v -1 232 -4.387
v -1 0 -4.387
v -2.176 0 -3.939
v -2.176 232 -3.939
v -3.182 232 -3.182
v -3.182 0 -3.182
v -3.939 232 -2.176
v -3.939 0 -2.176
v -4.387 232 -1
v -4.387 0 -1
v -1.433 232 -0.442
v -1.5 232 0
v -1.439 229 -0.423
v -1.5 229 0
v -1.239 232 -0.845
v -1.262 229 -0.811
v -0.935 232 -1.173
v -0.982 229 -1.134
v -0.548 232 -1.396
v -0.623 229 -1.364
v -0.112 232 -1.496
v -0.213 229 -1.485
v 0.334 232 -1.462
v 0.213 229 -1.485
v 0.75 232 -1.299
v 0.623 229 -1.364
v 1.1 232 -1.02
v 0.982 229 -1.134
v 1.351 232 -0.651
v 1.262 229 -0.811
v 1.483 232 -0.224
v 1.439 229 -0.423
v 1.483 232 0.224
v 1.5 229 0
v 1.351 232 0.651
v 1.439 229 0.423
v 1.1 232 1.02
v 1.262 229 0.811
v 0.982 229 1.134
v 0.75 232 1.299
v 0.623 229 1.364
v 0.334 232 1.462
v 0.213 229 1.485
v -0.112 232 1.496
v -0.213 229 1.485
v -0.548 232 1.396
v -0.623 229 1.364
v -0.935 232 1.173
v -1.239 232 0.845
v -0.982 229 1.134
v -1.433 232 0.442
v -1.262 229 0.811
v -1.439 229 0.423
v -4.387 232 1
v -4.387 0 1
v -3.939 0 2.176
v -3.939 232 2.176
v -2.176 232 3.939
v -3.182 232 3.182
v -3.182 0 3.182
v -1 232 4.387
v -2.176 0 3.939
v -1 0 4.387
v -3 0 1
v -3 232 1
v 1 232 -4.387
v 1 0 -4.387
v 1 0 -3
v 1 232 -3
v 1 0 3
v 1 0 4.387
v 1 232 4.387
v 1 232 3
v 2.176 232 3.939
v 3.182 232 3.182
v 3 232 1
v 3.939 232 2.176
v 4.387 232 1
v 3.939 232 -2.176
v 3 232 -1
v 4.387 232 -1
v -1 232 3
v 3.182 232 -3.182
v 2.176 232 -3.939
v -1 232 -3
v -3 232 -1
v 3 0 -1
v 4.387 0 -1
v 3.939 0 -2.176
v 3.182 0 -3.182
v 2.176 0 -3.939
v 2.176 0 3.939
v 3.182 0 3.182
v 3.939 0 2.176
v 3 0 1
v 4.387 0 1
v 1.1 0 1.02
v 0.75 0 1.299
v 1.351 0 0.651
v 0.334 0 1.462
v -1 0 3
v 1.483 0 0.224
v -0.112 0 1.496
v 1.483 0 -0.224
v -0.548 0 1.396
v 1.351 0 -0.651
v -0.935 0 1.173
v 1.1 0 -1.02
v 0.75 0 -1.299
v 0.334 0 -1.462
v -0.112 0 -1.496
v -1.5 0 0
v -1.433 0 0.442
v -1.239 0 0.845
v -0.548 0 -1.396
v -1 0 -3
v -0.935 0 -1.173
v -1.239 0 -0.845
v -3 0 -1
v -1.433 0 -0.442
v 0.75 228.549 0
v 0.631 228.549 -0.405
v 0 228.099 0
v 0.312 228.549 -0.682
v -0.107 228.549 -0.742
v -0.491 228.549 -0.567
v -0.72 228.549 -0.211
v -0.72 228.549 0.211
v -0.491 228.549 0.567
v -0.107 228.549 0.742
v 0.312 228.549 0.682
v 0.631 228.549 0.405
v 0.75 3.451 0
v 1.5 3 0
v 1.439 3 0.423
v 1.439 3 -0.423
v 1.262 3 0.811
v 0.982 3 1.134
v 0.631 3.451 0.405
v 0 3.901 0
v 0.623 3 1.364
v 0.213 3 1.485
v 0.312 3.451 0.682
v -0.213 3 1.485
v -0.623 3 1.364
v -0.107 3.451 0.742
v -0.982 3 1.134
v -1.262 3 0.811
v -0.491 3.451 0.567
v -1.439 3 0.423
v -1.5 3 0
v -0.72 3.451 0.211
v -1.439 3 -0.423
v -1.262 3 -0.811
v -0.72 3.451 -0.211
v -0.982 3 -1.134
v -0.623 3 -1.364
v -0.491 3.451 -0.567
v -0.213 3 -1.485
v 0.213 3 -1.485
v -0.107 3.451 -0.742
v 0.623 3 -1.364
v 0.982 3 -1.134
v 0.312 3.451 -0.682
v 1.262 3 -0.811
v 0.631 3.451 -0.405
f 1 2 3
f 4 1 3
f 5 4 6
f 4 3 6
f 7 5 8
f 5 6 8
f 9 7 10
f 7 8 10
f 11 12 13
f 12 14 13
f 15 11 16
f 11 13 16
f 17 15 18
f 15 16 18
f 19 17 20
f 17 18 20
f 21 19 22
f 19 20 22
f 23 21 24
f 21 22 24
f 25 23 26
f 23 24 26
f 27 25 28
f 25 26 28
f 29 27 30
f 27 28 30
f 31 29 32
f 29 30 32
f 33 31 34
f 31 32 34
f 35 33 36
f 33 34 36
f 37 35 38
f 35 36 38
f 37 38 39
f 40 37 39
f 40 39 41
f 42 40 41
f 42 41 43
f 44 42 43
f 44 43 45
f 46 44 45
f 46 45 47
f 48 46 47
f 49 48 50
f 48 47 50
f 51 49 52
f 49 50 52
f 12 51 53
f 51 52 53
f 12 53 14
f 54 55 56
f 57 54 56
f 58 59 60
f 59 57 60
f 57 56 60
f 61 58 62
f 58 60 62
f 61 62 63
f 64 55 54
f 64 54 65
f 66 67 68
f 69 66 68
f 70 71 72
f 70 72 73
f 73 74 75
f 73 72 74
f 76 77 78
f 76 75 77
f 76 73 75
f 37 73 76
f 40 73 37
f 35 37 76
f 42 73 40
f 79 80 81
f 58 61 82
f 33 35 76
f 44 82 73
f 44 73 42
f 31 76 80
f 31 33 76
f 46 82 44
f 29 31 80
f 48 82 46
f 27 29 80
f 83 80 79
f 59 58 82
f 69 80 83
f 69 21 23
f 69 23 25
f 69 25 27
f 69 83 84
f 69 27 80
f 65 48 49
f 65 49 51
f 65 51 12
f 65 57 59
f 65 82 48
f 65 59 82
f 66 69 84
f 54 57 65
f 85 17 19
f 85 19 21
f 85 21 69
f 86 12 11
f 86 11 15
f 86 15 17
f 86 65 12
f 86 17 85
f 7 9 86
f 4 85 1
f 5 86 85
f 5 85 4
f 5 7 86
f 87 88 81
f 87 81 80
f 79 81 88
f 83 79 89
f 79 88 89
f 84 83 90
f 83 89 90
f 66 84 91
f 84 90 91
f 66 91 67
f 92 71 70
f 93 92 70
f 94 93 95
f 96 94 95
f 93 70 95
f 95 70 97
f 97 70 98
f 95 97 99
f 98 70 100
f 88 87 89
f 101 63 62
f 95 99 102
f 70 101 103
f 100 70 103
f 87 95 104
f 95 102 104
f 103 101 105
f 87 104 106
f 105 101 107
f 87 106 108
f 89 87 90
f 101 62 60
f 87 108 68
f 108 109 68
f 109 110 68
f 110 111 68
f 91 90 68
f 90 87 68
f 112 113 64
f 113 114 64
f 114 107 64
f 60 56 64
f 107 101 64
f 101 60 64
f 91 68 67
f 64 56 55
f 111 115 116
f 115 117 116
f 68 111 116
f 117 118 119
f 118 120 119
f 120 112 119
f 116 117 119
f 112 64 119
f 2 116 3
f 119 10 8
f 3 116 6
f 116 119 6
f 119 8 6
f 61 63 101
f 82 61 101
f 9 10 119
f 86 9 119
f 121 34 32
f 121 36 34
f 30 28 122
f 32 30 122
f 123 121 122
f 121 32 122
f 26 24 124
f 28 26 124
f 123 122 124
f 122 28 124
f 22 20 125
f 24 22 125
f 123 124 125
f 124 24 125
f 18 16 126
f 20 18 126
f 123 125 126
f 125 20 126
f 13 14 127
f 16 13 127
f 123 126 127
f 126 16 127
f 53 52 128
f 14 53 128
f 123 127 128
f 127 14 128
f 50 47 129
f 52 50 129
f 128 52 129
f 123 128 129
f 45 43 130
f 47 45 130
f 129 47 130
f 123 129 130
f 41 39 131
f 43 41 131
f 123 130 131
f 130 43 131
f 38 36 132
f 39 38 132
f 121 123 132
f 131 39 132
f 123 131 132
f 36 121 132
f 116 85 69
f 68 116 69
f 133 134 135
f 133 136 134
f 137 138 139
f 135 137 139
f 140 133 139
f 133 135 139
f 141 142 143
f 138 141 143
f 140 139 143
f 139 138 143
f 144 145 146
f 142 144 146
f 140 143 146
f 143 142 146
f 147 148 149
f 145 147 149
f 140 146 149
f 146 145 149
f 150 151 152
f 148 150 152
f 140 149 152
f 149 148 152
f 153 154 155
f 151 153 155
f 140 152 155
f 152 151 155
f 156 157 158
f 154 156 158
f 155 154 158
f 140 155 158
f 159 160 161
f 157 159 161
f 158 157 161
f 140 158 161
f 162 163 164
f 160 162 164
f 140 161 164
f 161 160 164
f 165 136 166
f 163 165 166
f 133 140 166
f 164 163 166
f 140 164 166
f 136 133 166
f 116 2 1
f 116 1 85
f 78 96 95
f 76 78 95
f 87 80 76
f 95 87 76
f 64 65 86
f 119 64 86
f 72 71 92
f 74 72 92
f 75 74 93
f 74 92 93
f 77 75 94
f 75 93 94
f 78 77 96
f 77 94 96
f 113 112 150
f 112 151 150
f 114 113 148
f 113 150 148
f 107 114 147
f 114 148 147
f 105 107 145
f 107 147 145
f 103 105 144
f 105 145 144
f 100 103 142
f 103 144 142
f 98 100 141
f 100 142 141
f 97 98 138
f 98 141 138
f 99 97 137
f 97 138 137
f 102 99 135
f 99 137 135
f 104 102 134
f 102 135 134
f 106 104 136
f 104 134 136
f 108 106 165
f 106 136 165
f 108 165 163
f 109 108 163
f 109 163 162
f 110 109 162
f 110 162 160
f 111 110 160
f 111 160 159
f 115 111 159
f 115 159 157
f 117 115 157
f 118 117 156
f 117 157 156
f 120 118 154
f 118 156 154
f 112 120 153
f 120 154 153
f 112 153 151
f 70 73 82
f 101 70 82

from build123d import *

# Parameters (mm, degrees)
SKETCH1_R                 = 4.5
BOSS_EXTRUDE1_DEPTH       = 232
F_3_0MM_DOWEL_HOLE1_D     = 3
F_3_0MM_DOWEL_HOLE1_DEPTH = 3
F_3_0MM_DOWEL_HOLE1_TIP   = 0.901290929
F_3_0MM_DOWEL_HOLE2_D     = 3
F_3_0MM_DOWEL_HOLE2_DEPTH = 3
F_3_0MM_DOWEL_HOLE2_TIP   = 0.901290929
SKETCH6_W                 = 2
SKETCH6_H                 = 2
CUT_EXTRUDE1_DEPTH        = 233.08726807
CIRPATTERN1_COUNT         = 4


with BuildPart() as part:
    # Sketch1 → Boss-Extrude1 (new body)
    with BuildSketch(Plane(origin=(0, 0, 0), x_dir=(1, 0, 0), z_dir=(0, 1, 0))):
        with Locations(Location((0, 0, 0), (0, 0, 90))):
            Circle(SKETCH1_R)
    extrude(amount=BOSS_EXTRUDE1_DEPTH)

    # Ø3.0mm Dowel Hole1
    with Locations(Plane.XZ):
        with Locations((0, 0)):
            Hole(F_3_0MM_DOWEL_HOLE1_D / 2, depth=F_3_0MM_DOWEL_HOLE1_DEPTH)
            with Locations((0, 0, -(F_3_0MM_DOWEL_HOLE1_DEPTH + F_3_0MM_DOWEL_HOLE1_TIP / 2))):  # 118° drill point
                Cone(0, F_3_0MM_DOWEL_HOLE1_D / 2, F_3_0MM_DOWEL_HOLE1_TIP, mode=Mode.SUBTRACT)

    # Ø3.0mm Dowel Hole2
    with Locations(Plane(origin=(0, 232, 0), x_dir=(1, 0, 0), z_dir=(0, 1, 0))):
        with Locations((0, 0)):
            Hole(F_3_0MM_DOWEL_HOLE2_D / 2, depth=F_3_0MM_DOWEL_HOLE2_DEPTH)
            with Locations((0, 0, -(F_3_0MM_DOWEL_HOLE2_DEPTH + F_3_0MM_DOWEL_HOLE2_TIP / 2))):  # 118° drill point
                Cone(0, F_3_0MM_DOWEL_HOLE2_D / 2, F_3_0MM_DOWEL_HOLE2_TIP, mode=Mode.SUBTRACT)

    # Sketch6 → Cut-Extrude1 (cut, through all)
    with BuildSketch(Plane(origin=(0, 232, 0), x_dir=(1, 0, 0), z_dir=(0, 1, 0))):
        with Locations((-4, 0)):
            Rectangle(SKETCH6_W, SKETCH6_H)
    cut_extrude1 = extrude(amount=-CUT_EXTRUDE1_DEPTH, mode=Mode.SUBTRACT)

    # CirPattern1: Cut-Extrude1 ×4 about axis
    cirpattern1_axis = Axis((0, 0, 0), (0, 1, 0))
    for i in range(1, CIRPATTERN1_COUNT):
        add(cut_extrude1.rotate(cirpattern1_axis, i * 360 / CIRPATTERN1_COUNT), mode=Mode.SUBTRACT)


solid = part.part
